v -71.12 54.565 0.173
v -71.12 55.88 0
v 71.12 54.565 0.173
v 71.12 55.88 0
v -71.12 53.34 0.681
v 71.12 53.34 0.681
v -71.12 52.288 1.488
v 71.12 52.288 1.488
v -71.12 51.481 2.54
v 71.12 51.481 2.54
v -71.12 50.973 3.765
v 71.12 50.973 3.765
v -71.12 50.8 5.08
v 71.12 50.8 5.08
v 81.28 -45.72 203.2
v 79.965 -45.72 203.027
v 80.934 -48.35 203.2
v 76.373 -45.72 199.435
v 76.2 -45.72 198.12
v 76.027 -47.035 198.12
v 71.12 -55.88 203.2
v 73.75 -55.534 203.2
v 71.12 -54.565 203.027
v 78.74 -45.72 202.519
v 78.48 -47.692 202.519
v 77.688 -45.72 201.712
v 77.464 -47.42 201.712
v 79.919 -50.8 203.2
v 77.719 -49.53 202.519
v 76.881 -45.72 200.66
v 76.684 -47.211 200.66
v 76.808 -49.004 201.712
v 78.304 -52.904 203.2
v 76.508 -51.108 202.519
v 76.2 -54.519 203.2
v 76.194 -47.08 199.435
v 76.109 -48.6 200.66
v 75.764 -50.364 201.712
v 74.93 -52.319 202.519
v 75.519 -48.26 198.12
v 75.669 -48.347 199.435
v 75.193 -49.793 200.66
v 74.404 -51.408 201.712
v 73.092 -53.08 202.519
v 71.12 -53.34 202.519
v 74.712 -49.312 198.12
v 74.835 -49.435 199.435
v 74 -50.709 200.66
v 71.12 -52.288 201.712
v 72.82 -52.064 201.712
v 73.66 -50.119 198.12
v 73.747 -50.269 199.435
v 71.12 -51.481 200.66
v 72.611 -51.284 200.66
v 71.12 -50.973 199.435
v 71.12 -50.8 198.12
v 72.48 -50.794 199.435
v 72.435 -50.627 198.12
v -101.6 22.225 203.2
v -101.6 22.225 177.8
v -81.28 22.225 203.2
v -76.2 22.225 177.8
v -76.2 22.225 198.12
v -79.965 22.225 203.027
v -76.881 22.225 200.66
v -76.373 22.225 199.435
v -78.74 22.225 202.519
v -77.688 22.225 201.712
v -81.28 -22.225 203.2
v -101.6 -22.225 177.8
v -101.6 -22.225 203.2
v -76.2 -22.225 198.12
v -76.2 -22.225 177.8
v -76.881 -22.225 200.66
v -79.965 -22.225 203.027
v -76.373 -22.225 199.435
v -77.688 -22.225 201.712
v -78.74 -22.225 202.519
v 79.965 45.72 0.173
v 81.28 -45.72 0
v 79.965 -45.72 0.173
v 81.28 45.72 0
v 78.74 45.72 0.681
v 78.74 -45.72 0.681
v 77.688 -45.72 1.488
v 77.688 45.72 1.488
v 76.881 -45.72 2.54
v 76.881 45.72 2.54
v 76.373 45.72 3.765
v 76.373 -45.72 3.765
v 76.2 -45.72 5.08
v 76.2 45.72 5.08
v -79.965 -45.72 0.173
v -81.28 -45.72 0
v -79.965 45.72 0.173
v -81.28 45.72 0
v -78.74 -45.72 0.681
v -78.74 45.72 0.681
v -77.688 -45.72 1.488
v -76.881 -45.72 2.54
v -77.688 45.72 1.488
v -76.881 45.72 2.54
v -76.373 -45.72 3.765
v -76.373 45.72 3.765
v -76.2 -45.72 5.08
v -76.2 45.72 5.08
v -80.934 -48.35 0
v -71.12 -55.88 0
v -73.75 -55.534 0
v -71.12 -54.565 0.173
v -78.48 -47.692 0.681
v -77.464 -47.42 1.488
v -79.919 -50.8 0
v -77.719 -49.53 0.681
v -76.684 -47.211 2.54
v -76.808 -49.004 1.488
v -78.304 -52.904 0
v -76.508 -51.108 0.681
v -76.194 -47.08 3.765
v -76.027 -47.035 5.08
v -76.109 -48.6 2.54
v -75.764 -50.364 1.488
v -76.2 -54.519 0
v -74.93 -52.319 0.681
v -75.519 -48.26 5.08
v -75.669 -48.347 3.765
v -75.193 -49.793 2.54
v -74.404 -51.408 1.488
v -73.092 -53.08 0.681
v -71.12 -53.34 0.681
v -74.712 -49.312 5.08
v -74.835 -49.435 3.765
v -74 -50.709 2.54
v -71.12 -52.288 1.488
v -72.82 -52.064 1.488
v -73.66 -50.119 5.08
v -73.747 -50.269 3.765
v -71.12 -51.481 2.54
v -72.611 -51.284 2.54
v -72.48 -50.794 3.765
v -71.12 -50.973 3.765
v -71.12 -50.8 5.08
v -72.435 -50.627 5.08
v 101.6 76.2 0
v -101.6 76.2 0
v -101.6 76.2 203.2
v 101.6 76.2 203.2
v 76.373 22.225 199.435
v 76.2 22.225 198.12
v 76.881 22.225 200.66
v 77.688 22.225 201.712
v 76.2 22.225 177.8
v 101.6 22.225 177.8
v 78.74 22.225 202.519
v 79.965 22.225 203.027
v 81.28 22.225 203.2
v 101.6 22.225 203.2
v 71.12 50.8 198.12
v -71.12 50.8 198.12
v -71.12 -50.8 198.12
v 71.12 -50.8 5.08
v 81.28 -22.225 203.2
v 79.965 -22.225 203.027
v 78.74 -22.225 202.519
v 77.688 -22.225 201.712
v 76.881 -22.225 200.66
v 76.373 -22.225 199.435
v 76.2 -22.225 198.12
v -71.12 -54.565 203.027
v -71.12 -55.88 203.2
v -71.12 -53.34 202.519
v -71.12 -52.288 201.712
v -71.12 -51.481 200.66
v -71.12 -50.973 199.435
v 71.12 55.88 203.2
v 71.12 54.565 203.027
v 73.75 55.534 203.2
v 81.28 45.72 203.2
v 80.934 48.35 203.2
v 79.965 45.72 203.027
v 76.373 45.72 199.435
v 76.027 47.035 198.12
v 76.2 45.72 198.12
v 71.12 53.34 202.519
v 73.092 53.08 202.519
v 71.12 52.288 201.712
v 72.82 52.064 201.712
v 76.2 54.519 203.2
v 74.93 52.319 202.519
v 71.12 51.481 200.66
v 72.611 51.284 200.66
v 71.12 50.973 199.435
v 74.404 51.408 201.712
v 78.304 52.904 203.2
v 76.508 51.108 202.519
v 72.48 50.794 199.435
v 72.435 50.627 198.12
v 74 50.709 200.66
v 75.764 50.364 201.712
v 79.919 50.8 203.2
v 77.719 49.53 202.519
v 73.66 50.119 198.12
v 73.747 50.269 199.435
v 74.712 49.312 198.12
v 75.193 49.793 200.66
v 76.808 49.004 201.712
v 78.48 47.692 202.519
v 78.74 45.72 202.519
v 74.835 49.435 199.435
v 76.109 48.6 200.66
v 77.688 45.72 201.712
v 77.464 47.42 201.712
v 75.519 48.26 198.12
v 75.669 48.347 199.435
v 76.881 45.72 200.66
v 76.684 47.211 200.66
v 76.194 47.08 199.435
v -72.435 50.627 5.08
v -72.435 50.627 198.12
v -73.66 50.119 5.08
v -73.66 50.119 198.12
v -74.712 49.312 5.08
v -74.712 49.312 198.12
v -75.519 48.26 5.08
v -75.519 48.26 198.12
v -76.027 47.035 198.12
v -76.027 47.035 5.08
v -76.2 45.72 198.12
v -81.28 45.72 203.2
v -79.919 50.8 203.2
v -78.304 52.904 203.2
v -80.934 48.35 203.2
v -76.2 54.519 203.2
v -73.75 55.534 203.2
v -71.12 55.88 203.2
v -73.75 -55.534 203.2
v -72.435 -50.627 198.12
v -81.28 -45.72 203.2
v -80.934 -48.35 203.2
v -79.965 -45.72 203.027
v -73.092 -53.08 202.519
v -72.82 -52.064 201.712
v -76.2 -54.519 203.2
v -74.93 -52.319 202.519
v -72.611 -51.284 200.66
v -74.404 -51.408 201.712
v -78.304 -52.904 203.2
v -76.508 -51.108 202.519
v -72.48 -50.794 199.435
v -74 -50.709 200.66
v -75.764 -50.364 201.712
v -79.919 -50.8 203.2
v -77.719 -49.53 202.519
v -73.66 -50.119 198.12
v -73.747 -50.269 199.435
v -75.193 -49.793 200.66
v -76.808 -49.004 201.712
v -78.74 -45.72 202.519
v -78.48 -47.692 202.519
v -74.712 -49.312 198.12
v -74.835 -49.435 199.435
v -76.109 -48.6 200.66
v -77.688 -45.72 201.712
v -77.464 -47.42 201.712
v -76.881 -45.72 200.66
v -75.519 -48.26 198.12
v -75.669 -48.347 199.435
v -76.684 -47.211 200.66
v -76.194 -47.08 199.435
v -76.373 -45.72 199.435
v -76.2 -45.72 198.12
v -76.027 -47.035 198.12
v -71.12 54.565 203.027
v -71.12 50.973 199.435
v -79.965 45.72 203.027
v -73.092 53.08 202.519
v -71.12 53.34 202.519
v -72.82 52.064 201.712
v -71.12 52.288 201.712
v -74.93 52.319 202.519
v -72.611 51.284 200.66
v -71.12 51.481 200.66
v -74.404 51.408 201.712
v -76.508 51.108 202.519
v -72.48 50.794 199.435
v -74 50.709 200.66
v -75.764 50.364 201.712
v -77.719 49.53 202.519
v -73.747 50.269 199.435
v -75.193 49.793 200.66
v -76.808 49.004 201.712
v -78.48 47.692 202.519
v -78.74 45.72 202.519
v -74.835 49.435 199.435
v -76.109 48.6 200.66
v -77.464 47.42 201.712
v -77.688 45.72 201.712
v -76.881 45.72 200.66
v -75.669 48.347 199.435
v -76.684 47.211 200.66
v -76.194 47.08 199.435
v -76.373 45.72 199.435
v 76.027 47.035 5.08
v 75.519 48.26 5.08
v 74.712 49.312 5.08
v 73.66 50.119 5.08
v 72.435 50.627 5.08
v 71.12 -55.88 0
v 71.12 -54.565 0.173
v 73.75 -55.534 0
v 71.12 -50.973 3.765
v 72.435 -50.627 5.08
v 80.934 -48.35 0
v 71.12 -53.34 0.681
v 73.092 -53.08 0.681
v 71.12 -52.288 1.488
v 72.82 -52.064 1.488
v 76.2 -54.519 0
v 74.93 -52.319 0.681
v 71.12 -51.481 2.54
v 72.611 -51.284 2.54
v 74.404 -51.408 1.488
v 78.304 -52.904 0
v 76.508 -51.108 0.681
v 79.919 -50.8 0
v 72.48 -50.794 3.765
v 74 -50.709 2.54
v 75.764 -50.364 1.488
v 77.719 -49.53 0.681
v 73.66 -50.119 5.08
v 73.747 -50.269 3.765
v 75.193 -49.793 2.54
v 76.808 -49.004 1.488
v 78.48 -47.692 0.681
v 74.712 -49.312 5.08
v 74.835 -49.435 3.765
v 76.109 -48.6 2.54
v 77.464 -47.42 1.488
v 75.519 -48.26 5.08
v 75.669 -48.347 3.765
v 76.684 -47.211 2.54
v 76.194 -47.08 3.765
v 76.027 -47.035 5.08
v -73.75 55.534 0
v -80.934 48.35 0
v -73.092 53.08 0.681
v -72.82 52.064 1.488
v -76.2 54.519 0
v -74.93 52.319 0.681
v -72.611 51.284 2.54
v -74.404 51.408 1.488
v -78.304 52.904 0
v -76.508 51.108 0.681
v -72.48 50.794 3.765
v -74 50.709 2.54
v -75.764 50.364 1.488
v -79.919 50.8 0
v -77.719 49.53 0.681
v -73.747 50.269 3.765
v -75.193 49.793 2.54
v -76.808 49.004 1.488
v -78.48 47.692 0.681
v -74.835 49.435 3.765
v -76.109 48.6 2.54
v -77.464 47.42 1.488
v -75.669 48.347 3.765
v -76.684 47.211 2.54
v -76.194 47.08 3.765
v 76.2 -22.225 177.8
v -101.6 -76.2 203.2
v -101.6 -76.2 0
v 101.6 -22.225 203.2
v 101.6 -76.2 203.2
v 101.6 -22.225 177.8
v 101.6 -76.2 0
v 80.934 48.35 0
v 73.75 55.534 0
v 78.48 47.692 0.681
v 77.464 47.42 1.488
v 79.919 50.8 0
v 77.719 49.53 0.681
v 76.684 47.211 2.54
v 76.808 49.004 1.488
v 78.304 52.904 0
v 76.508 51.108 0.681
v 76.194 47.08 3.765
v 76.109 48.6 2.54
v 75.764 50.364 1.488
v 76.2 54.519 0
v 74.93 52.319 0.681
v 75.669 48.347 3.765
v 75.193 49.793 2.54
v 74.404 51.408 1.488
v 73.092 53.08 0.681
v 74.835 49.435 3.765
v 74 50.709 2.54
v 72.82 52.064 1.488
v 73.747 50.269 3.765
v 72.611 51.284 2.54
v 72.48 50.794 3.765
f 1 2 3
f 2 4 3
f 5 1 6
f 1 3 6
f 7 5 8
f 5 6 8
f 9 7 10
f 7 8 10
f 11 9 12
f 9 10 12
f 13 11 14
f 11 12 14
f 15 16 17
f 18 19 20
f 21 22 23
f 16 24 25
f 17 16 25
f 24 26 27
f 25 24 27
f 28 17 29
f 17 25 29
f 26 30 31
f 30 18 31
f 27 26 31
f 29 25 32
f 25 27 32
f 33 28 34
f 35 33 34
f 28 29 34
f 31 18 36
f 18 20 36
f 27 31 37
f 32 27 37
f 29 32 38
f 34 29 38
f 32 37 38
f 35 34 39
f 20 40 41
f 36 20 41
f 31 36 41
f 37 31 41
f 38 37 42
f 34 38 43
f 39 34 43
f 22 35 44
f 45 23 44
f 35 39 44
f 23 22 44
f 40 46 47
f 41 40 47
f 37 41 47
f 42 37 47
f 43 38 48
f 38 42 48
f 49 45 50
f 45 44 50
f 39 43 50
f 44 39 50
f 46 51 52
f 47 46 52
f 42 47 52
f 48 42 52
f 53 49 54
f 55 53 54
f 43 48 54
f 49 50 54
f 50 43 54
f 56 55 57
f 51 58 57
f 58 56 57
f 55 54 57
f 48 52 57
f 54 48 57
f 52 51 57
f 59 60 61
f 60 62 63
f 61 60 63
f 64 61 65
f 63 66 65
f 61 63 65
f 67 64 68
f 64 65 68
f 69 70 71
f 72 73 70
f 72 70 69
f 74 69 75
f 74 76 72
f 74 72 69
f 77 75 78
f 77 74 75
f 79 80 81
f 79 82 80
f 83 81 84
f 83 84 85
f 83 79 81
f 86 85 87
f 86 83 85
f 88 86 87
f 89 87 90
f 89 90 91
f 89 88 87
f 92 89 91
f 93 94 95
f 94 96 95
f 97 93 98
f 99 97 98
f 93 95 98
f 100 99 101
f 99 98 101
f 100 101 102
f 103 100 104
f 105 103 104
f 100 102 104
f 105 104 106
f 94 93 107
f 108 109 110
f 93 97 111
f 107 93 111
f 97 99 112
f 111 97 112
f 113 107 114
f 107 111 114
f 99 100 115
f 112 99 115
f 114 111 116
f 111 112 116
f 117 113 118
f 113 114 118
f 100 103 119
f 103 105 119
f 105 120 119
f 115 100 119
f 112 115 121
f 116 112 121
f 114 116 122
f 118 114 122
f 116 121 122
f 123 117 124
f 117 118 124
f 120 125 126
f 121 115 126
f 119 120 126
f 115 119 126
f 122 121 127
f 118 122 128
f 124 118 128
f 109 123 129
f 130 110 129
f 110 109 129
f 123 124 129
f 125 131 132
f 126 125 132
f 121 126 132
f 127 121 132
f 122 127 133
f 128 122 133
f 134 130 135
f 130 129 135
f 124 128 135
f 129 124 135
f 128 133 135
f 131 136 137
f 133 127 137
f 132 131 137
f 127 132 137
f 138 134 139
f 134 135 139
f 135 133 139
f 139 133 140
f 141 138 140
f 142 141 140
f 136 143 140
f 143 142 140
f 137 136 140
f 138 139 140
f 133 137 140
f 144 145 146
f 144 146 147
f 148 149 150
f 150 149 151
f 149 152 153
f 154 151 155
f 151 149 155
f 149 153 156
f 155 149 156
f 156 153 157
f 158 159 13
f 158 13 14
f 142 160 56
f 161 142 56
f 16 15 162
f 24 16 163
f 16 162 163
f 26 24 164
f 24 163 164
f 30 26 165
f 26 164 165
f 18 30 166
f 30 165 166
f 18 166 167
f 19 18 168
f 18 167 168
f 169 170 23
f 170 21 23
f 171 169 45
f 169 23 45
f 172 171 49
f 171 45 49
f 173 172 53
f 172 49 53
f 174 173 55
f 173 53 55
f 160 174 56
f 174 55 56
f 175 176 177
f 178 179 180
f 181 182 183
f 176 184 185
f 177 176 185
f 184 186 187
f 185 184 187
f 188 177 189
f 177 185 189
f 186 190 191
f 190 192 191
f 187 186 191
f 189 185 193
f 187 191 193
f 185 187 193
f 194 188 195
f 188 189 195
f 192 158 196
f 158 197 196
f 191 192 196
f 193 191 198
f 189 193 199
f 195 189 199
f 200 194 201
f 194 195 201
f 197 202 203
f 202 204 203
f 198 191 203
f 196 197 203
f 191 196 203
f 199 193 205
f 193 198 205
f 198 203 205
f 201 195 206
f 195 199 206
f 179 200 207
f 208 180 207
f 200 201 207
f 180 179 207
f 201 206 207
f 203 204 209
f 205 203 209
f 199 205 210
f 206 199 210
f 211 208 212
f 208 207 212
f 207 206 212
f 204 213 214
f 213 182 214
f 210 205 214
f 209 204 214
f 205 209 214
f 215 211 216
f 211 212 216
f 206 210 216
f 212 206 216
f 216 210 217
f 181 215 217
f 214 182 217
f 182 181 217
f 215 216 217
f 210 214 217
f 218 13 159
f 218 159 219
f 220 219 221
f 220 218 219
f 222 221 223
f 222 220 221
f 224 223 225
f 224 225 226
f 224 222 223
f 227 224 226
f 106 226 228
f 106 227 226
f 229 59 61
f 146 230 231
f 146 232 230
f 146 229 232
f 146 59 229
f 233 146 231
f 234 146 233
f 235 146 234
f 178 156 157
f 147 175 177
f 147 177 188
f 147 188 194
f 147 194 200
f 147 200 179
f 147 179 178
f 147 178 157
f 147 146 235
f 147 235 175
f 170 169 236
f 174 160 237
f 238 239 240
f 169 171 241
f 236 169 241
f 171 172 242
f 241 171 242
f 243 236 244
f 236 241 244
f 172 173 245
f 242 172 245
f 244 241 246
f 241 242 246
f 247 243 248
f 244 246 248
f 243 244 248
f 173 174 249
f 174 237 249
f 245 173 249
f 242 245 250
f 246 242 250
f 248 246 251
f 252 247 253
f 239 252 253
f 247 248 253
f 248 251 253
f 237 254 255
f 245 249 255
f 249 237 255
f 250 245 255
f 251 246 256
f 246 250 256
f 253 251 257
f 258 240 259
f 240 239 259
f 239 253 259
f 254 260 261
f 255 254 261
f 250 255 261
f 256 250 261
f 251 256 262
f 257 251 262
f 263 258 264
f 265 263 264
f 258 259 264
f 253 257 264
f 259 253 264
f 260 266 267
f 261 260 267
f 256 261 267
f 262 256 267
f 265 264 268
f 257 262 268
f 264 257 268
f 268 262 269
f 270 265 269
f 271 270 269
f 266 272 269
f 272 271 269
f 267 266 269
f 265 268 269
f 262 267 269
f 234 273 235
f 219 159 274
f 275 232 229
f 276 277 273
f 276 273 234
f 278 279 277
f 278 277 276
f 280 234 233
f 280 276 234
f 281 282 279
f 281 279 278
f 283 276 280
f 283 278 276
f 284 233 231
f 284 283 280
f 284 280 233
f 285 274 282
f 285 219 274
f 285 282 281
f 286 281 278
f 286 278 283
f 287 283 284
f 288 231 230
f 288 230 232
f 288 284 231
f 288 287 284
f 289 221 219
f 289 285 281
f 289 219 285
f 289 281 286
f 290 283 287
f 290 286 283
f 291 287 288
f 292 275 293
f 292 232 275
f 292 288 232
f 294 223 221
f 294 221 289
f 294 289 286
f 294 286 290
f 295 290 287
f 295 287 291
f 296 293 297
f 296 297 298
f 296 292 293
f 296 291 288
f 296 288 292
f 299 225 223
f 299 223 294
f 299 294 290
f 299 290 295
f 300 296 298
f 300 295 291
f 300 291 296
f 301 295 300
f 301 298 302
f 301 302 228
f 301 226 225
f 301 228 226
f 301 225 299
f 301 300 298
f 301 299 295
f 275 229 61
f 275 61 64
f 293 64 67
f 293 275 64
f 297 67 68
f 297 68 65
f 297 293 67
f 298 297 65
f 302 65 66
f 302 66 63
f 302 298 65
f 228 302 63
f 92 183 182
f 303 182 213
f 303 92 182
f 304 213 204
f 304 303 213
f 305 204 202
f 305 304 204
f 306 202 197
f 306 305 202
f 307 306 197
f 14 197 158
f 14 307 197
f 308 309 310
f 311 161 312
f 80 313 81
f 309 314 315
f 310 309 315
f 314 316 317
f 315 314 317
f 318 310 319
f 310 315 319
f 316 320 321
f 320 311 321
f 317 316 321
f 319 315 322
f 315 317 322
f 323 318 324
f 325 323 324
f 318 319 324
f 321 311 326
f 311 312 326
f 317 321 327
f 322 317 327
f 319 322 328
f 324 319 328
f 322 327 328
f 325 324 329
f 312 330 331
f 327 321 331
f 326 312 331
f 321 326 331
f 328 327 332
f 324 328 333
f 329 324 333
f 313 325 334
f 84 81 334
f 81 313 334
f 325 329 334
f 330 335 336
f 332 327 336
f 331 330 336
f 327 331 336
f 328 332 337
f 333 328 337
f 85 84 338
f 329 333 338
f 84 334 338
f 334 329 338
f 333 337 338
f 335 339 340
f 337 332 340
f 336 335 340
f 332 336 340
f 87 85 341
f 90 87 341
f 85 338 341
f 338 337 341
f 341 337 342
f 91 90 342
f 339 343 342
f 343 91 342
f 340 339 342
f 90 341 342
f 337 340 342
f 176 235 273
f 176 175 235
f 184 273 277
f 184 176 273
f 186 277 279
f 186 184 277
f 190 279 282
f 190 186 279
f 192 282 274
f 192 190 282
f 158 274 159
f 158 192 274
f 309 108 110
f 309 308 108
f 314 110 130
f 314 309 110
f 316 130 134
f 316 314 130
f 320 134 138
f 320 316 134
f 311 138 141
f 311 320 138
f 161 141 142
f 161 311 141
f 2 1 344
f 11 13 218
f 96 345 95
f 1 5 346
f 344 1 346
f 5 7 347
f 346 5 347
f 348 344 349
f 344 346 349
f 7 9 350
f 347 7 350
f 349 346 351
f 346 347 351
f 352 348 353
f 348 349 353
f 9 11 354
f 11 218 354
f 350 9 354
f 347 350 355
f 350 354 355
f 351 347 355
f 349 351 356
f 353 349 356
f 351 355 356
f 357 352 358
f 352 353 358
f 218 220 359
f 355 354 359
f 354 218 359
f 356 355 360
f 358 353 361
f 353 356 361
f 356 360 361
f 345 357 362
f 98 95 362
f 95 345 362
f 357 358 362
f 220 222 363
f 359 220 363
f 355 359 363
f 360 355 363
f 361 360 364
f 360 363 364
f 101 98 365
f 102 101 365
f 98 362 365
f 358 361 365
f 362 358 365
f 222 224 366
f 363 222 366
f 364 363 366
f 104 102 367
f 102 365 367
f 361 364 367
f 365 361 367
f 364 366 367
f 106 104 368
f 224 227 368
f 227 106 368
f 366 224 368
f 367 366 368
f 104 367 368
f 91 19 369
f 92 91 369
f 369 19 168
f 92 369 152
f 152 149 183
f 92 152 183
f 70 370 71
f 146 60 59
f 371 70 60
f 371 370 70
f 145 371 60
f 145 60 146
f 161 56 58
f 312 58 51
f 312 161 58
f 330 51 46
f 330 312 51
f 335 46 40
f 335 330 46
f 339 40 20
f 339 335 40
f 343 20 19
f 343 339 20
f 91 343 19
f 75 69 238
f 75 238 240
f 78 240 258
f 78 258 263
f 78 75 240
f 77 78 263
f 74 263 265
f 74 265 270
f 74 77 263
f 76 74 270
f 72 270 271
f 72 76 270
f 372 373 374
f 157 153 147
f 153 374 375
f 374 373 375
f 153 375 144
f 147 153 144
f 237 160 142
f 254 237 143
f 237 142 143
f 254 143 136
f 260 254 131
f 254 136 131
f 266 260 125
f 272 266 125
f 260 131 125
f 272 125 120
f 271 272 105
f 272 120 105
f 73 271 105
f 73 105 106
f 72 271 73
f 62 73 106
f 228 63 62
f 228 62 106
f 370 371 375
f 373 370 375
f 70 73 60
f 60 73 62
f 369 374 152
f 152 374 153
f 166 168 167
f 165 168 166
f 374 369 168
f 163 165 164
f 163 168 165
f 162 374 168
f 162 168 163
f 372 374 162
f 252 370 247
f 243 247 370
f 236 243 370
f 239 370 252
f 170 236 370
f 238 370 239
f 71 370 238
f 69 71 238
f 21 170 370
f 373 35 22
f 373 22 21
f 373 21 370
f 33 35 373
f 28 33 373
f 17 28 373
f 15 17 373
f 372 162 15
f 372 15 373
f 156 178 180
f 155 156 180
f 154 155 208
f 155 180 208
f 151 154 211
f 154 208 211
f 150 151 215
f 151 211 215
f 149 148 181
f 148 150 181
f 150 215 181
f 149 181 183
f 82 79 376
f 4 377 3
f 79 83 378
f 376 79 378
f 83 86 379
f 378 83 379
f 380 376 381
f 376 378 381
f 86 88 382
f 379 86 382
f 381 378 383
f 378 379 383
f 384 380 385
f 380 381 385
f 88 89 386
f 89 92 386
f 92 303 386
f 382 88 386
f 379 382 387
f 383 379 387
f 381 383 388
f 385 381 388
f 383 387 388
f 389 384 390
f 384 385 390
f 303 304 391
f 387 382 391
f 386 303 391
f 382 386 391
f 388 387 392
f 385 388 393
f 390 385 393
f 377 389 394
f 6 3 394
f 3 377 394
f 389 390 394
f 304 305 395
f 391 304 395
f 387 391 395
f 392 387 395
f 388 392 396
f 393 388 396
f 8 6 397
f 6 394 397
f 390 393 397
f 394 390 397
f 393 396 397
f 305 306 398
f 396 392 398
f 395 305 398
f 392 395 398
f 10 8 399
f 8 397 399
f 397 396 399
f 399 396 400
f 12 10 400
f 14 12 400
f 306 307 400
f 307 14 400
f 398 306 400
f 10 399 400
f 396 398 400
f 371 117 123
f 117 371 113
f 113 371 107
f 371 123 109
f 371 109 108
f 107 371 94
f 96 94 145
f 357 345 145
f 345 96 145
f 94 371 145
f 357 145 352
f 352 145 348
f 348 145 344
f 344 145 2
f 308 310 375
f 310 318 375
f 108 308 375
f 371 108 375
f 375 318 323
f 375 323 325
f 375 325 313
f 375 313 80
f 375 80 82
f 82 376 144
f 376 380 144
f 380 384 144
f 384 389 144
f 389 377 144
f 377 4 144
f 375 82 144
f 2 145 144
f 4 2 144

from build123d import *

# Parameters (mm, degrees)
F0_W     = 203.2
F0_H     = 152.4
F1_DEPTH = 203.2
F2_W     = 152.4
F2_H     = 101.6
F3_DEPTH = 203.201
F4_R     = 5.08
F5_W     = 44.45
F5_H     = 25.4
F6_DEPTH = 203.2


with BuildPart() as f1:
    # F0 (on Top) → F1 (new body)
    with BuildSketch(Plane.XY):
        Rectangle(F0_W, F0_H)
    extrude(amount=F1_DEPTH)

    # F2 (on face) → F3 (cut, through all)
    with BuildSketch(Plane.XY.offset(203.2)):
        Rectangle(F2_W, F2_H)
    extrude(amount=-F3_DEPTH, mode=Mode.SUBTRACT)

    # F4
    f4_edges = [f1.edges().sort_by_distance(p)[0] for p in [
        (-76.2, 0, 203.2),
        (-76.2, -50.8, 101.6),
        (-76.2, 0, 0),
        (-76.2, 50.8, 101.6),
        (0, -50.8, 203.2),
        (76.2, -50.8, 101.6),
        (0, -50.8, 0),
        (76.2, 0, 203.2),
        (76.2, 50.8, 101.6),
        (76.2, 0, 0),
        (0, 50.8, 203.2),
        (0, 50.8, 0),
    ]]
    fillet(f4_edges, radius=F4_R)

    # F5 (on face) → F6 (cut)
    with BuildSketch(Plane.YZ.offset(101.6)):
        with Locations((0, 190.5)):
            Rectangle(F5_W, F5_H)
    extrude(amount=-F6_DEPTH, mode=Mode.SUBTRACT)


solid = f1.part
